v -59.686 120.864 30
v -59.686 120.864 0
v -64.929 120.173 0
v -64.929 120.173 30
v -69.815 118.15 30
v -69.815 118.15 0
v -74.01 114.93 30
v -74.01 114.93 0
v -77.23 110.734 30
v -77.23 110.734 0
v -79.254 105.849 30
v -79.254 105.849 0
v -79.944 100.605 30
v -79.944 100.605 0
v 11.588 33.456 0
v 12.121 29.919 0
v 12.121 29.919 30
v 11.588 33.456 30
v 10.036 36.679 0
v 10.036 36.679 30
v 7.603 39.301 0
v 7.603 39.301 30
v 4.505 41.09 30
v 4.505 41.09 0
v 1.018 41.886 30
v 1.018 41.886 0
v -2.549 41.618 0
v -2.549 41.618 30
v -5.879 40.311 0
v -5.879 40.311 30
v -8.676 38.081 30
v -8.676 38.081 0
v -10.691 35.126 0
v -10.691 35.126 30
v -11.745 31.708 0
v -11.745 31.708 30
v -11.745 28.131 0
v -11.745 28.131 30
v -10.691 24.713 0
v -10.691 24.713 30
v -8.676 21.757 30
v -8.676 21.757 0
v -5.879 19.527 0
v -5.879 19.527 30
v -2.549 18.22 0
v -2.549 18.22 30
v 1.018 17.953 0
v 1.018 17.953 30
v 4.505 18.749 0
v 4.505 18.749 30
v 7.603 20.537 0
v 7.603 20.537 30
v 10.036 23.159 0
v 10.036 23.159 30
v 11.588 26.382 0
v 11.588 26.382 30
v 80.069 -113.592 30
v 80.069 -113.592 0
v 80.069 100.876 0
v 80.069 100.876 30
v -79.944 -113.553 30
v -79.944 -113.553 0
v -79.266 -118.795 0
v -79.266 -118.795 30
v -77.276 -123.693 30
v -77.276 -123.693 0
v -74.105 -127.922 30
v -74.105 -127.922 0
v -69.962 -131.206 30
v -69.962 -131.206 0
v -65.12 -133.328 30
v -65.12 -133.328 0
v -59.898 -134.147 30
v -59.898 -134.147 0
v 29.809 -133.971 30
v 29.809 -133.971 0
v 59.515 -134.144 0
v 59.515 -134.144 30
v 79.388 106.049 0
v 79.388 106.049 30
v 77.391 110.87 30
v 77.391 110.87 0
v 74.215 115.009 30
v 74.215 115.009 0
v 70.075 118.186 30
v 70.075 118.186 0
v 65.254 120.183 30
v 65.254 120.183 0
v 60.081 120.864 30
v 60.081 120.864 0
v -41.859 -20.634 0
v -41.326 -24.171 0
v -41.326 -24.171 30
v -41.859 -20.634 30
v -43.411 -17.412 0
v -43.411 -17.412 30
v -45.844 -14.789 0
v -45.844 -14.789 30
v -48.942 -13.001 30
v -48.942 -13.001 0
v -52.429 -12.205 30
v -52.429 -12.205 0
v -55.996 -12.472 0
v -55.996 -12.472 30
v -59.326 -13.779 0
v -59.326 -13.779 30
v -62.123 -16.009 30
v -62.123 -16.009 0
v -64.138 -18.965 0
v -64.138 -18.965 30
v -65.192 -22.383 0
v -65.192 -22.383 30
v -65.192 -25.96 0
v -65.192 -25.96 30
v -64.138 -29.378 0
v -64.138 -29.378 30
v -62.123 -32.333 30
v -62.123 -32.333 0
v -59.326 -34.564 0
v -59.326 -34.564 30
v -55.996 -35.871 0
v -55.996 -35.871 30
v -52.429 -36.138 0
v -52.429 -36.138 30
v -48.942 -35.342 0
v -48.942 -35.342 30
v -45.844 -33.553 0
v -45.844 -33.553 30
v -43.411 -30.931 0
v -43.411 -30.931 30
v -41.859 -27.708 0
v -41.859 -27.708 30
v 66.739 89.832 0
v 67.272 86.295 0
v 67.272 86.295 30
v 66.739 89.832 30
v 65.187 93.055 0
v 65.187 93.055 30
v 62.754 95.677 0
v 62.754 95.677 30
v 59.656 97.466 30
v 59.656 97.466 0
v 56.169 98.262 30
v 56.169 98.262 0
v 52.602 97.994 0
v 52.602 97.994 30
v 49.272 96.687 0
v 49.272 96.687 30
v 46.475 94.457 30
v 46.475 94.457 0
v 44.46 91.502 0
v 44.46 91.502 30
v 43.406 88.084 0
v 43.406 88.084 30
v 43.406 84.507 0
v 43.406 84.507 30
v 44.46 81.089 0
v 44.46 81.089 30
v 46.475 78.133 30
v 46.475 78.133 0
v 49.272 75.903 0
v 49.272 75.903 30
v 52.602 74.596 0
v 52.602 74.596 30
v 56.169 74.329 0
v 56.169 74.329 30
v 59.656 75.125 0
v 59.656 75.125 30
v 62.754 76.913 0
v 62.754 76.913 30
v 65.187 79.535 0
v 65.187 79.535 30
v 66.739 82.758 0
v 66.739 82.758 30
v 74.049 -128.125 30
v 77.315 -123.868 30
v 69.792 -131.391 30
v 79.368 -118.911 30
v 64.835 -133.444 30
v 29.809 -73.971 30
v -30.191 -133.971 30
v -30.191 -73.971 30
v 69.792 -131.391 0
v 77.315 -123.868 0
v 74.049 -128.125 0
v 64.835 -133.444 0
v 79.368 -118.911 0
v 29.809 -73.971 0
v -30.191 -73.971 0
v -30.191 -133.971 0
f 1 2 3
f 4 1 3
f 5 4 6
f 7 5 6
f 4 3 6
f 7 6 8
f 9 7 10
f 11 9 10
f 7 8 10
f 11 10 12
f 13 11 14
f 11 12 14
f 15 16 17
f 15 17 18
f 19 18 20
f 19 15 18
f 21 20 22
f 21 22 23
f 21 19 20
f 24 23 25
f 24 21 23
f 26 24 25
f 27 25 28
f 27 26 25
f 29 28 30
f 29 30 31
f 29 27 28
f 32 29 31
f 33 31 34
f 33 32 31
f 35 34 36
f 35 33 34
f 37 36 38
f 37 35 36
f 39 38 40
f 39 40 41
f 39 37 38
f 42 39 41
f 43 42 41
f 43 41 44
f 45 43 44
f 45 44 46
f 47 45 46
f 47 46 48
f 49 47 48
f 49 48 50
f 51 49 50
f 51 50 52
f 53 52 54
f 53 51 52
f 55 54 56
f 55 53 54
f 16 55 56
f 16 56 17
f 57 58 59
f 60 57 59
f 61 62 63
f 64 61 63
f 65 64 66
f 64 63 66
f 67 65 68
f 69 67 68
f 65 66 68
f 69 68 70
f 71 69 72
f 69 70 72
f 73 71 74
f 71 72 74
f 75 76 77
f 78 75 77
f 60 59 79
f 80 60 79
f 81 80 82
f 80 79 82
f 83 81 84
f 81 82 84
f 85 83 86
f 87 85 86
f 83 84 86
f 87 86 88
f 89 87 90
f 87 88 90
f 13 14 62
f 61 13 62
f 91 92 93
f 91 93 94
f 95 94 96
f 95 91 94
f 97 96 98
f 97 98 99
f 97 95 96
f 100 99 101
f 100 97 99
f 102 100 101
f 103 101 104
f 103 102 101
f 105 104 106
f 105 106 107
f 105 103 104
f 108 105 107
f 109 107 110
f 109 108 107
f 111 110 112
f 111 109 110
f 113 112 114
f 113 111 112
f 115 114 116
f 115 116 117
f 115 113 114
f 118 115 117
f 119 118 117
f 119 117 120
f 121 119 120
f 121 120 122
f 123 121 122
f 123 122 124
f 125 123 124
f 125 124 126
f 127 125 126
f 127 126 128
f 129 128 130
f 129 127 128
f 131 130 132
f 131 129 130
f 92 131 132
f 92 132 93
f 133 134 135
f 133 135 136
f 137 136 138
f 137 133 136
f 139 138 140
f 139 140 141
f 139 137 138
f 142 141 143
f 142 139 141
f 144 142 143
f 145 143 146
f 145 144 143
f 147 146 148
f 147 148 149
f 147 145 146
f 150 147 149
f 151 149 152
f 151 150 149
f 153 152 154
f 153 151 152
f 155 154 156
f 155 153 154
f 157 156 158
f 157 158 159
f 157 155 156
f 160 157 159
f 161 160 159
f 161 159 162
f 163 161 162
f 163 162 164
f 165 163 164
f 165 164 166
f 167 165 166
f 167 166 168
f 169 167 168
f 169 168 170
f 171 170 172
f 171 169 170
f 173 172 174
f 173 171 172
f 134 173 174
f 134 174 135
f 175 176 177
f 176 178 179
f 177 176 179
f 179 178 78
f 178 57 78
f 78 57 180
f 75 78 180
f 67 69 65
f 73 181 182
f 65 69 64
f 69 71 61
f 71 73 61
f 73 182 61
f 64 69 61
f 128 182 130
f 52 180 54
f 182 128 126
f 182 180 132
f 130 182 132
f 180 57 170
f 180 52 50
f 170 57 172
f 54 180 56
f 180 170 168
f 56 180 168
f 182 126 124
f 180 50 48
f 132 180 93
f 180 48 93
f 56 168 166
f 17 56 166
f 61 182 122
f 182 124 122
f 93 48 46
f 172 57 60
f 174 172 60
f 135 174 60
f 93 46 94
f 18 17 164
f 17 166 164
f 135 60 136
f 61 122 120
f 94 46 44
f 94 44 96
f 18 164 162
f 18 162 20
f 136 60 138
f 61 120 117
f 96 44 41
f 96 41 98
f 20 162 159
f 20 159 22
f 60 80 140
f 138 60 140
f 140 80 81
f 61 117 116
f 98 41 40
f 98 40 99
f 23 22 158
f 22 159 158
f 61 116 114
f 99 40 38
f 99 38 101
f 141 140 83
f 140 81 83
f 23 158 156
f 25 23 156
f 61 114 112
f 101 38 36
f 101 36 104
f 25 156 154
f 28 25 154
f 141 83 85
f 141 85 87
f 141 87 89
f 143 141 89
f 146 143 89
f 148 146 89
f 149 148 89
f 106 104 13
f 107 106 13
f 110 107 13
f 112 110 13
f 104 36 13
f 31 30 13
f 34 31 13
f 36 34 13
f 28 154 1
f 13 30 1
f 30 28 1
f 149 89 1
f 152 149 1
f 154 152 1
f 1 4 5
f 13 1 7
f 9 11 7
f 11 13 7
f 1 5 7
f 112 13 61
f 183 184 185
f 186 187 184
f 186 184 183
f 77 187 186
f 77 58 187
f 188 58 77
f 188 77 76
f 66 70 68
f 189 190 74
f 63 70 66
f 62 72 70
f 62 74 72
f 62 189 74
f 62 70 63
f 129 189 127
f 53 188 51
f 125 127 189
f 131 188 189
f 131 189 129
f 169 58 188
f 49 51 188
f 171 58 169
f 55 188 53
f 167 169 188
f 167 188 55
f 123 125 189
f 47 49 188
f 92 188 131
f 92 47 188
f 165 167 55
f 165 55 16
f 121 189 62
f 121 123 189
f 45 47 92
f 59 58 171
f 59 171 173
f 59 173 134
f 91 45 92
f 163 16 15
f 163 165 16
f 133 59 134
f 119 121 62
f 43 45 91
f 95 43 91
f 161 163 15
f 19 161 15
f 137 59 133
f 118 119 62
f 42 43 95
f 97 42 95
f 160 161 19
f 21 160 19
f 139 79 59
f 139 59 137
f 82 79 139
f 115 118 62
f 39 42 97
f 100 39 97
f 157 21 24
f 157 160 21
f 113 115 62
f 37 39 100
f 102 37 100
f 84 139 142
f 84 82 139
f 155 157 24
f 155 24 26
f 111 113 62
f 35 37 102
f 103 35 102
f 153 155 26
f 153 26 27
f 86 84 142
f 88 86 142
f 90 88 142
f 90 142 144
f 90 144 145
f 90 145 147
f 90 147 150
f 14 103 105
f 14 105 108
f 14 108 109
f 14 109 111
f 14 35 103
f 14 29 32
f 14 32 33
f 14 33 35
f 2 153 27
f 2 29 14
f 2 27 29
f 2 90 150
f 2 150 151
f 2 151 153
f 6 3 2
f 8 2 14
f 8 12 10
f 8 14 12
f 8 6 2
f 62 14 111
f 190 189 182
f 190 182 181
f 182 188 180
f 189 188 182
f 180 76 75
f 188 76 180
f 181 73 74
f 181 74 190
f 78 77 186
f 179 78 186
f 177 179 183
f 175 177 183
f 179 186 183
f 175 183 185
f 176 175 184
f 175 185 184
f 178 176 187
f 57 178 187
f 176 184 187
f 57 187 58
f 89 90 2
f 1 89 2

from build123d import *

# Parameters (mm, degrees)
SKETCH_R     = 12
PAD_DEPTH    = 30
PAD001_DEPTH = 30


with BuildPart() as part:
    # Sketch → Pad (new body)
    with BuildSketch(Plane.XY):
        with BuildLine():
            Line((29.808627, -133.970841), (29.808627, -73.970841))
            Line((29.808627, -73.970841), (-30.191373, -73.970841))
            Line((-30.191373, -73.970841), (-30.191373, -133.970841))
            Line((-59.898036, -134.146891), (-30.191373, -133.970841))
            ThreePointArc((-79.943921, -113.552778), (-74.10502, -127.922494), (-59.898036, -134.146891))
            Line((-79.943921, 100.605318), (-79.943921, -113.552778))
            ThreePointArc((-59.685634, 120.863606), (-74.010406, 114.930091), (-79.943921, 100.605318))
            Line((60.081005, 120.863606), (-59.685634, 120.863606))
            ThreePointArc((80.068853, 100.875757), (74.214548, 115.009301), (60.081005, 120.863606))
            Line((80.068853, -113.591927), (80.068853, 100.875757))
            ThreePointArc((59.515305, -134.144193), (74.048781, -128.125027), (80.068853, -113.591927))
            Line((29.808627, -133.970841), (59.515305, -134.144193))
        make_face()
        with Locations((0.120778, 29.919195)):
            Circle(SKETCH_R, mode=Mode.SUBTRACT)
        with Locations((-53.325886, -24.171413)):
            Circle(SKETCH_R, mode=Mode.SUBTRACT)
        with Locations((55.271923, 86.295181)):
            Circle(SKETCH_R, mode=Mode.SUBTRACT)
    extrude(amount=PAD_DEPTH)

    # Sketch → Pad001 (join)
    with BuildSketch(Plane.XY):
        with BuildLine():
            Line((29.808627, -133.970841), (29.808627, -73.970841))
            Line((29.808627, -73.970841), (-30.191373, -73.970841))
            Line((-30.191373, -73.970841), (-30.191373, -133.970841))
            Line((-59.898036, -134.146891), (-30.191373, -133.970841))
            ThreePointArc((-79.943921, -113.552778), (-74.10502, -127.922494), (-59.898036, -134.146891))
            Line((-79.943921, 100.605318), (-79.943921, -113.552778))
            ThreePointArc((-59.685634, 120.863606), (-74.010406, 114.930091), (-79.943921, 100.605318))
            Line((60.081005, 120.863606), (-59.685634, 120.863606))
            ThreePointArc((80.068853, 100.875757), (74.214548, 115.009301), (60.081005, 120.863606))
            Line((80.068853, -113.591927), (80.068853, 100.875757))
            ThreePointArc((59.515305, -134.144193), (74.048781, -128.125027), (80.068853, -113.591927))
            Line((29.808627, -133.970841), (59.515305, -134.144193))
        make_face()
        with Locations((0.120778, 29.919195)):
            Circle(SKETCH_R, mode=Mode.SUBTRACT)
        with Locations((-53.325886, -24.171413)):
            Circle(SKETCH_R, mode=Mode.SUBTRACT)
        with Locations((55.271923, 86.295181)):
            Circle(SKETCH_R, mode=Mode.SUBTRACT)
    extrude(amount=PAD001_DEPTH)


solid = part.part
